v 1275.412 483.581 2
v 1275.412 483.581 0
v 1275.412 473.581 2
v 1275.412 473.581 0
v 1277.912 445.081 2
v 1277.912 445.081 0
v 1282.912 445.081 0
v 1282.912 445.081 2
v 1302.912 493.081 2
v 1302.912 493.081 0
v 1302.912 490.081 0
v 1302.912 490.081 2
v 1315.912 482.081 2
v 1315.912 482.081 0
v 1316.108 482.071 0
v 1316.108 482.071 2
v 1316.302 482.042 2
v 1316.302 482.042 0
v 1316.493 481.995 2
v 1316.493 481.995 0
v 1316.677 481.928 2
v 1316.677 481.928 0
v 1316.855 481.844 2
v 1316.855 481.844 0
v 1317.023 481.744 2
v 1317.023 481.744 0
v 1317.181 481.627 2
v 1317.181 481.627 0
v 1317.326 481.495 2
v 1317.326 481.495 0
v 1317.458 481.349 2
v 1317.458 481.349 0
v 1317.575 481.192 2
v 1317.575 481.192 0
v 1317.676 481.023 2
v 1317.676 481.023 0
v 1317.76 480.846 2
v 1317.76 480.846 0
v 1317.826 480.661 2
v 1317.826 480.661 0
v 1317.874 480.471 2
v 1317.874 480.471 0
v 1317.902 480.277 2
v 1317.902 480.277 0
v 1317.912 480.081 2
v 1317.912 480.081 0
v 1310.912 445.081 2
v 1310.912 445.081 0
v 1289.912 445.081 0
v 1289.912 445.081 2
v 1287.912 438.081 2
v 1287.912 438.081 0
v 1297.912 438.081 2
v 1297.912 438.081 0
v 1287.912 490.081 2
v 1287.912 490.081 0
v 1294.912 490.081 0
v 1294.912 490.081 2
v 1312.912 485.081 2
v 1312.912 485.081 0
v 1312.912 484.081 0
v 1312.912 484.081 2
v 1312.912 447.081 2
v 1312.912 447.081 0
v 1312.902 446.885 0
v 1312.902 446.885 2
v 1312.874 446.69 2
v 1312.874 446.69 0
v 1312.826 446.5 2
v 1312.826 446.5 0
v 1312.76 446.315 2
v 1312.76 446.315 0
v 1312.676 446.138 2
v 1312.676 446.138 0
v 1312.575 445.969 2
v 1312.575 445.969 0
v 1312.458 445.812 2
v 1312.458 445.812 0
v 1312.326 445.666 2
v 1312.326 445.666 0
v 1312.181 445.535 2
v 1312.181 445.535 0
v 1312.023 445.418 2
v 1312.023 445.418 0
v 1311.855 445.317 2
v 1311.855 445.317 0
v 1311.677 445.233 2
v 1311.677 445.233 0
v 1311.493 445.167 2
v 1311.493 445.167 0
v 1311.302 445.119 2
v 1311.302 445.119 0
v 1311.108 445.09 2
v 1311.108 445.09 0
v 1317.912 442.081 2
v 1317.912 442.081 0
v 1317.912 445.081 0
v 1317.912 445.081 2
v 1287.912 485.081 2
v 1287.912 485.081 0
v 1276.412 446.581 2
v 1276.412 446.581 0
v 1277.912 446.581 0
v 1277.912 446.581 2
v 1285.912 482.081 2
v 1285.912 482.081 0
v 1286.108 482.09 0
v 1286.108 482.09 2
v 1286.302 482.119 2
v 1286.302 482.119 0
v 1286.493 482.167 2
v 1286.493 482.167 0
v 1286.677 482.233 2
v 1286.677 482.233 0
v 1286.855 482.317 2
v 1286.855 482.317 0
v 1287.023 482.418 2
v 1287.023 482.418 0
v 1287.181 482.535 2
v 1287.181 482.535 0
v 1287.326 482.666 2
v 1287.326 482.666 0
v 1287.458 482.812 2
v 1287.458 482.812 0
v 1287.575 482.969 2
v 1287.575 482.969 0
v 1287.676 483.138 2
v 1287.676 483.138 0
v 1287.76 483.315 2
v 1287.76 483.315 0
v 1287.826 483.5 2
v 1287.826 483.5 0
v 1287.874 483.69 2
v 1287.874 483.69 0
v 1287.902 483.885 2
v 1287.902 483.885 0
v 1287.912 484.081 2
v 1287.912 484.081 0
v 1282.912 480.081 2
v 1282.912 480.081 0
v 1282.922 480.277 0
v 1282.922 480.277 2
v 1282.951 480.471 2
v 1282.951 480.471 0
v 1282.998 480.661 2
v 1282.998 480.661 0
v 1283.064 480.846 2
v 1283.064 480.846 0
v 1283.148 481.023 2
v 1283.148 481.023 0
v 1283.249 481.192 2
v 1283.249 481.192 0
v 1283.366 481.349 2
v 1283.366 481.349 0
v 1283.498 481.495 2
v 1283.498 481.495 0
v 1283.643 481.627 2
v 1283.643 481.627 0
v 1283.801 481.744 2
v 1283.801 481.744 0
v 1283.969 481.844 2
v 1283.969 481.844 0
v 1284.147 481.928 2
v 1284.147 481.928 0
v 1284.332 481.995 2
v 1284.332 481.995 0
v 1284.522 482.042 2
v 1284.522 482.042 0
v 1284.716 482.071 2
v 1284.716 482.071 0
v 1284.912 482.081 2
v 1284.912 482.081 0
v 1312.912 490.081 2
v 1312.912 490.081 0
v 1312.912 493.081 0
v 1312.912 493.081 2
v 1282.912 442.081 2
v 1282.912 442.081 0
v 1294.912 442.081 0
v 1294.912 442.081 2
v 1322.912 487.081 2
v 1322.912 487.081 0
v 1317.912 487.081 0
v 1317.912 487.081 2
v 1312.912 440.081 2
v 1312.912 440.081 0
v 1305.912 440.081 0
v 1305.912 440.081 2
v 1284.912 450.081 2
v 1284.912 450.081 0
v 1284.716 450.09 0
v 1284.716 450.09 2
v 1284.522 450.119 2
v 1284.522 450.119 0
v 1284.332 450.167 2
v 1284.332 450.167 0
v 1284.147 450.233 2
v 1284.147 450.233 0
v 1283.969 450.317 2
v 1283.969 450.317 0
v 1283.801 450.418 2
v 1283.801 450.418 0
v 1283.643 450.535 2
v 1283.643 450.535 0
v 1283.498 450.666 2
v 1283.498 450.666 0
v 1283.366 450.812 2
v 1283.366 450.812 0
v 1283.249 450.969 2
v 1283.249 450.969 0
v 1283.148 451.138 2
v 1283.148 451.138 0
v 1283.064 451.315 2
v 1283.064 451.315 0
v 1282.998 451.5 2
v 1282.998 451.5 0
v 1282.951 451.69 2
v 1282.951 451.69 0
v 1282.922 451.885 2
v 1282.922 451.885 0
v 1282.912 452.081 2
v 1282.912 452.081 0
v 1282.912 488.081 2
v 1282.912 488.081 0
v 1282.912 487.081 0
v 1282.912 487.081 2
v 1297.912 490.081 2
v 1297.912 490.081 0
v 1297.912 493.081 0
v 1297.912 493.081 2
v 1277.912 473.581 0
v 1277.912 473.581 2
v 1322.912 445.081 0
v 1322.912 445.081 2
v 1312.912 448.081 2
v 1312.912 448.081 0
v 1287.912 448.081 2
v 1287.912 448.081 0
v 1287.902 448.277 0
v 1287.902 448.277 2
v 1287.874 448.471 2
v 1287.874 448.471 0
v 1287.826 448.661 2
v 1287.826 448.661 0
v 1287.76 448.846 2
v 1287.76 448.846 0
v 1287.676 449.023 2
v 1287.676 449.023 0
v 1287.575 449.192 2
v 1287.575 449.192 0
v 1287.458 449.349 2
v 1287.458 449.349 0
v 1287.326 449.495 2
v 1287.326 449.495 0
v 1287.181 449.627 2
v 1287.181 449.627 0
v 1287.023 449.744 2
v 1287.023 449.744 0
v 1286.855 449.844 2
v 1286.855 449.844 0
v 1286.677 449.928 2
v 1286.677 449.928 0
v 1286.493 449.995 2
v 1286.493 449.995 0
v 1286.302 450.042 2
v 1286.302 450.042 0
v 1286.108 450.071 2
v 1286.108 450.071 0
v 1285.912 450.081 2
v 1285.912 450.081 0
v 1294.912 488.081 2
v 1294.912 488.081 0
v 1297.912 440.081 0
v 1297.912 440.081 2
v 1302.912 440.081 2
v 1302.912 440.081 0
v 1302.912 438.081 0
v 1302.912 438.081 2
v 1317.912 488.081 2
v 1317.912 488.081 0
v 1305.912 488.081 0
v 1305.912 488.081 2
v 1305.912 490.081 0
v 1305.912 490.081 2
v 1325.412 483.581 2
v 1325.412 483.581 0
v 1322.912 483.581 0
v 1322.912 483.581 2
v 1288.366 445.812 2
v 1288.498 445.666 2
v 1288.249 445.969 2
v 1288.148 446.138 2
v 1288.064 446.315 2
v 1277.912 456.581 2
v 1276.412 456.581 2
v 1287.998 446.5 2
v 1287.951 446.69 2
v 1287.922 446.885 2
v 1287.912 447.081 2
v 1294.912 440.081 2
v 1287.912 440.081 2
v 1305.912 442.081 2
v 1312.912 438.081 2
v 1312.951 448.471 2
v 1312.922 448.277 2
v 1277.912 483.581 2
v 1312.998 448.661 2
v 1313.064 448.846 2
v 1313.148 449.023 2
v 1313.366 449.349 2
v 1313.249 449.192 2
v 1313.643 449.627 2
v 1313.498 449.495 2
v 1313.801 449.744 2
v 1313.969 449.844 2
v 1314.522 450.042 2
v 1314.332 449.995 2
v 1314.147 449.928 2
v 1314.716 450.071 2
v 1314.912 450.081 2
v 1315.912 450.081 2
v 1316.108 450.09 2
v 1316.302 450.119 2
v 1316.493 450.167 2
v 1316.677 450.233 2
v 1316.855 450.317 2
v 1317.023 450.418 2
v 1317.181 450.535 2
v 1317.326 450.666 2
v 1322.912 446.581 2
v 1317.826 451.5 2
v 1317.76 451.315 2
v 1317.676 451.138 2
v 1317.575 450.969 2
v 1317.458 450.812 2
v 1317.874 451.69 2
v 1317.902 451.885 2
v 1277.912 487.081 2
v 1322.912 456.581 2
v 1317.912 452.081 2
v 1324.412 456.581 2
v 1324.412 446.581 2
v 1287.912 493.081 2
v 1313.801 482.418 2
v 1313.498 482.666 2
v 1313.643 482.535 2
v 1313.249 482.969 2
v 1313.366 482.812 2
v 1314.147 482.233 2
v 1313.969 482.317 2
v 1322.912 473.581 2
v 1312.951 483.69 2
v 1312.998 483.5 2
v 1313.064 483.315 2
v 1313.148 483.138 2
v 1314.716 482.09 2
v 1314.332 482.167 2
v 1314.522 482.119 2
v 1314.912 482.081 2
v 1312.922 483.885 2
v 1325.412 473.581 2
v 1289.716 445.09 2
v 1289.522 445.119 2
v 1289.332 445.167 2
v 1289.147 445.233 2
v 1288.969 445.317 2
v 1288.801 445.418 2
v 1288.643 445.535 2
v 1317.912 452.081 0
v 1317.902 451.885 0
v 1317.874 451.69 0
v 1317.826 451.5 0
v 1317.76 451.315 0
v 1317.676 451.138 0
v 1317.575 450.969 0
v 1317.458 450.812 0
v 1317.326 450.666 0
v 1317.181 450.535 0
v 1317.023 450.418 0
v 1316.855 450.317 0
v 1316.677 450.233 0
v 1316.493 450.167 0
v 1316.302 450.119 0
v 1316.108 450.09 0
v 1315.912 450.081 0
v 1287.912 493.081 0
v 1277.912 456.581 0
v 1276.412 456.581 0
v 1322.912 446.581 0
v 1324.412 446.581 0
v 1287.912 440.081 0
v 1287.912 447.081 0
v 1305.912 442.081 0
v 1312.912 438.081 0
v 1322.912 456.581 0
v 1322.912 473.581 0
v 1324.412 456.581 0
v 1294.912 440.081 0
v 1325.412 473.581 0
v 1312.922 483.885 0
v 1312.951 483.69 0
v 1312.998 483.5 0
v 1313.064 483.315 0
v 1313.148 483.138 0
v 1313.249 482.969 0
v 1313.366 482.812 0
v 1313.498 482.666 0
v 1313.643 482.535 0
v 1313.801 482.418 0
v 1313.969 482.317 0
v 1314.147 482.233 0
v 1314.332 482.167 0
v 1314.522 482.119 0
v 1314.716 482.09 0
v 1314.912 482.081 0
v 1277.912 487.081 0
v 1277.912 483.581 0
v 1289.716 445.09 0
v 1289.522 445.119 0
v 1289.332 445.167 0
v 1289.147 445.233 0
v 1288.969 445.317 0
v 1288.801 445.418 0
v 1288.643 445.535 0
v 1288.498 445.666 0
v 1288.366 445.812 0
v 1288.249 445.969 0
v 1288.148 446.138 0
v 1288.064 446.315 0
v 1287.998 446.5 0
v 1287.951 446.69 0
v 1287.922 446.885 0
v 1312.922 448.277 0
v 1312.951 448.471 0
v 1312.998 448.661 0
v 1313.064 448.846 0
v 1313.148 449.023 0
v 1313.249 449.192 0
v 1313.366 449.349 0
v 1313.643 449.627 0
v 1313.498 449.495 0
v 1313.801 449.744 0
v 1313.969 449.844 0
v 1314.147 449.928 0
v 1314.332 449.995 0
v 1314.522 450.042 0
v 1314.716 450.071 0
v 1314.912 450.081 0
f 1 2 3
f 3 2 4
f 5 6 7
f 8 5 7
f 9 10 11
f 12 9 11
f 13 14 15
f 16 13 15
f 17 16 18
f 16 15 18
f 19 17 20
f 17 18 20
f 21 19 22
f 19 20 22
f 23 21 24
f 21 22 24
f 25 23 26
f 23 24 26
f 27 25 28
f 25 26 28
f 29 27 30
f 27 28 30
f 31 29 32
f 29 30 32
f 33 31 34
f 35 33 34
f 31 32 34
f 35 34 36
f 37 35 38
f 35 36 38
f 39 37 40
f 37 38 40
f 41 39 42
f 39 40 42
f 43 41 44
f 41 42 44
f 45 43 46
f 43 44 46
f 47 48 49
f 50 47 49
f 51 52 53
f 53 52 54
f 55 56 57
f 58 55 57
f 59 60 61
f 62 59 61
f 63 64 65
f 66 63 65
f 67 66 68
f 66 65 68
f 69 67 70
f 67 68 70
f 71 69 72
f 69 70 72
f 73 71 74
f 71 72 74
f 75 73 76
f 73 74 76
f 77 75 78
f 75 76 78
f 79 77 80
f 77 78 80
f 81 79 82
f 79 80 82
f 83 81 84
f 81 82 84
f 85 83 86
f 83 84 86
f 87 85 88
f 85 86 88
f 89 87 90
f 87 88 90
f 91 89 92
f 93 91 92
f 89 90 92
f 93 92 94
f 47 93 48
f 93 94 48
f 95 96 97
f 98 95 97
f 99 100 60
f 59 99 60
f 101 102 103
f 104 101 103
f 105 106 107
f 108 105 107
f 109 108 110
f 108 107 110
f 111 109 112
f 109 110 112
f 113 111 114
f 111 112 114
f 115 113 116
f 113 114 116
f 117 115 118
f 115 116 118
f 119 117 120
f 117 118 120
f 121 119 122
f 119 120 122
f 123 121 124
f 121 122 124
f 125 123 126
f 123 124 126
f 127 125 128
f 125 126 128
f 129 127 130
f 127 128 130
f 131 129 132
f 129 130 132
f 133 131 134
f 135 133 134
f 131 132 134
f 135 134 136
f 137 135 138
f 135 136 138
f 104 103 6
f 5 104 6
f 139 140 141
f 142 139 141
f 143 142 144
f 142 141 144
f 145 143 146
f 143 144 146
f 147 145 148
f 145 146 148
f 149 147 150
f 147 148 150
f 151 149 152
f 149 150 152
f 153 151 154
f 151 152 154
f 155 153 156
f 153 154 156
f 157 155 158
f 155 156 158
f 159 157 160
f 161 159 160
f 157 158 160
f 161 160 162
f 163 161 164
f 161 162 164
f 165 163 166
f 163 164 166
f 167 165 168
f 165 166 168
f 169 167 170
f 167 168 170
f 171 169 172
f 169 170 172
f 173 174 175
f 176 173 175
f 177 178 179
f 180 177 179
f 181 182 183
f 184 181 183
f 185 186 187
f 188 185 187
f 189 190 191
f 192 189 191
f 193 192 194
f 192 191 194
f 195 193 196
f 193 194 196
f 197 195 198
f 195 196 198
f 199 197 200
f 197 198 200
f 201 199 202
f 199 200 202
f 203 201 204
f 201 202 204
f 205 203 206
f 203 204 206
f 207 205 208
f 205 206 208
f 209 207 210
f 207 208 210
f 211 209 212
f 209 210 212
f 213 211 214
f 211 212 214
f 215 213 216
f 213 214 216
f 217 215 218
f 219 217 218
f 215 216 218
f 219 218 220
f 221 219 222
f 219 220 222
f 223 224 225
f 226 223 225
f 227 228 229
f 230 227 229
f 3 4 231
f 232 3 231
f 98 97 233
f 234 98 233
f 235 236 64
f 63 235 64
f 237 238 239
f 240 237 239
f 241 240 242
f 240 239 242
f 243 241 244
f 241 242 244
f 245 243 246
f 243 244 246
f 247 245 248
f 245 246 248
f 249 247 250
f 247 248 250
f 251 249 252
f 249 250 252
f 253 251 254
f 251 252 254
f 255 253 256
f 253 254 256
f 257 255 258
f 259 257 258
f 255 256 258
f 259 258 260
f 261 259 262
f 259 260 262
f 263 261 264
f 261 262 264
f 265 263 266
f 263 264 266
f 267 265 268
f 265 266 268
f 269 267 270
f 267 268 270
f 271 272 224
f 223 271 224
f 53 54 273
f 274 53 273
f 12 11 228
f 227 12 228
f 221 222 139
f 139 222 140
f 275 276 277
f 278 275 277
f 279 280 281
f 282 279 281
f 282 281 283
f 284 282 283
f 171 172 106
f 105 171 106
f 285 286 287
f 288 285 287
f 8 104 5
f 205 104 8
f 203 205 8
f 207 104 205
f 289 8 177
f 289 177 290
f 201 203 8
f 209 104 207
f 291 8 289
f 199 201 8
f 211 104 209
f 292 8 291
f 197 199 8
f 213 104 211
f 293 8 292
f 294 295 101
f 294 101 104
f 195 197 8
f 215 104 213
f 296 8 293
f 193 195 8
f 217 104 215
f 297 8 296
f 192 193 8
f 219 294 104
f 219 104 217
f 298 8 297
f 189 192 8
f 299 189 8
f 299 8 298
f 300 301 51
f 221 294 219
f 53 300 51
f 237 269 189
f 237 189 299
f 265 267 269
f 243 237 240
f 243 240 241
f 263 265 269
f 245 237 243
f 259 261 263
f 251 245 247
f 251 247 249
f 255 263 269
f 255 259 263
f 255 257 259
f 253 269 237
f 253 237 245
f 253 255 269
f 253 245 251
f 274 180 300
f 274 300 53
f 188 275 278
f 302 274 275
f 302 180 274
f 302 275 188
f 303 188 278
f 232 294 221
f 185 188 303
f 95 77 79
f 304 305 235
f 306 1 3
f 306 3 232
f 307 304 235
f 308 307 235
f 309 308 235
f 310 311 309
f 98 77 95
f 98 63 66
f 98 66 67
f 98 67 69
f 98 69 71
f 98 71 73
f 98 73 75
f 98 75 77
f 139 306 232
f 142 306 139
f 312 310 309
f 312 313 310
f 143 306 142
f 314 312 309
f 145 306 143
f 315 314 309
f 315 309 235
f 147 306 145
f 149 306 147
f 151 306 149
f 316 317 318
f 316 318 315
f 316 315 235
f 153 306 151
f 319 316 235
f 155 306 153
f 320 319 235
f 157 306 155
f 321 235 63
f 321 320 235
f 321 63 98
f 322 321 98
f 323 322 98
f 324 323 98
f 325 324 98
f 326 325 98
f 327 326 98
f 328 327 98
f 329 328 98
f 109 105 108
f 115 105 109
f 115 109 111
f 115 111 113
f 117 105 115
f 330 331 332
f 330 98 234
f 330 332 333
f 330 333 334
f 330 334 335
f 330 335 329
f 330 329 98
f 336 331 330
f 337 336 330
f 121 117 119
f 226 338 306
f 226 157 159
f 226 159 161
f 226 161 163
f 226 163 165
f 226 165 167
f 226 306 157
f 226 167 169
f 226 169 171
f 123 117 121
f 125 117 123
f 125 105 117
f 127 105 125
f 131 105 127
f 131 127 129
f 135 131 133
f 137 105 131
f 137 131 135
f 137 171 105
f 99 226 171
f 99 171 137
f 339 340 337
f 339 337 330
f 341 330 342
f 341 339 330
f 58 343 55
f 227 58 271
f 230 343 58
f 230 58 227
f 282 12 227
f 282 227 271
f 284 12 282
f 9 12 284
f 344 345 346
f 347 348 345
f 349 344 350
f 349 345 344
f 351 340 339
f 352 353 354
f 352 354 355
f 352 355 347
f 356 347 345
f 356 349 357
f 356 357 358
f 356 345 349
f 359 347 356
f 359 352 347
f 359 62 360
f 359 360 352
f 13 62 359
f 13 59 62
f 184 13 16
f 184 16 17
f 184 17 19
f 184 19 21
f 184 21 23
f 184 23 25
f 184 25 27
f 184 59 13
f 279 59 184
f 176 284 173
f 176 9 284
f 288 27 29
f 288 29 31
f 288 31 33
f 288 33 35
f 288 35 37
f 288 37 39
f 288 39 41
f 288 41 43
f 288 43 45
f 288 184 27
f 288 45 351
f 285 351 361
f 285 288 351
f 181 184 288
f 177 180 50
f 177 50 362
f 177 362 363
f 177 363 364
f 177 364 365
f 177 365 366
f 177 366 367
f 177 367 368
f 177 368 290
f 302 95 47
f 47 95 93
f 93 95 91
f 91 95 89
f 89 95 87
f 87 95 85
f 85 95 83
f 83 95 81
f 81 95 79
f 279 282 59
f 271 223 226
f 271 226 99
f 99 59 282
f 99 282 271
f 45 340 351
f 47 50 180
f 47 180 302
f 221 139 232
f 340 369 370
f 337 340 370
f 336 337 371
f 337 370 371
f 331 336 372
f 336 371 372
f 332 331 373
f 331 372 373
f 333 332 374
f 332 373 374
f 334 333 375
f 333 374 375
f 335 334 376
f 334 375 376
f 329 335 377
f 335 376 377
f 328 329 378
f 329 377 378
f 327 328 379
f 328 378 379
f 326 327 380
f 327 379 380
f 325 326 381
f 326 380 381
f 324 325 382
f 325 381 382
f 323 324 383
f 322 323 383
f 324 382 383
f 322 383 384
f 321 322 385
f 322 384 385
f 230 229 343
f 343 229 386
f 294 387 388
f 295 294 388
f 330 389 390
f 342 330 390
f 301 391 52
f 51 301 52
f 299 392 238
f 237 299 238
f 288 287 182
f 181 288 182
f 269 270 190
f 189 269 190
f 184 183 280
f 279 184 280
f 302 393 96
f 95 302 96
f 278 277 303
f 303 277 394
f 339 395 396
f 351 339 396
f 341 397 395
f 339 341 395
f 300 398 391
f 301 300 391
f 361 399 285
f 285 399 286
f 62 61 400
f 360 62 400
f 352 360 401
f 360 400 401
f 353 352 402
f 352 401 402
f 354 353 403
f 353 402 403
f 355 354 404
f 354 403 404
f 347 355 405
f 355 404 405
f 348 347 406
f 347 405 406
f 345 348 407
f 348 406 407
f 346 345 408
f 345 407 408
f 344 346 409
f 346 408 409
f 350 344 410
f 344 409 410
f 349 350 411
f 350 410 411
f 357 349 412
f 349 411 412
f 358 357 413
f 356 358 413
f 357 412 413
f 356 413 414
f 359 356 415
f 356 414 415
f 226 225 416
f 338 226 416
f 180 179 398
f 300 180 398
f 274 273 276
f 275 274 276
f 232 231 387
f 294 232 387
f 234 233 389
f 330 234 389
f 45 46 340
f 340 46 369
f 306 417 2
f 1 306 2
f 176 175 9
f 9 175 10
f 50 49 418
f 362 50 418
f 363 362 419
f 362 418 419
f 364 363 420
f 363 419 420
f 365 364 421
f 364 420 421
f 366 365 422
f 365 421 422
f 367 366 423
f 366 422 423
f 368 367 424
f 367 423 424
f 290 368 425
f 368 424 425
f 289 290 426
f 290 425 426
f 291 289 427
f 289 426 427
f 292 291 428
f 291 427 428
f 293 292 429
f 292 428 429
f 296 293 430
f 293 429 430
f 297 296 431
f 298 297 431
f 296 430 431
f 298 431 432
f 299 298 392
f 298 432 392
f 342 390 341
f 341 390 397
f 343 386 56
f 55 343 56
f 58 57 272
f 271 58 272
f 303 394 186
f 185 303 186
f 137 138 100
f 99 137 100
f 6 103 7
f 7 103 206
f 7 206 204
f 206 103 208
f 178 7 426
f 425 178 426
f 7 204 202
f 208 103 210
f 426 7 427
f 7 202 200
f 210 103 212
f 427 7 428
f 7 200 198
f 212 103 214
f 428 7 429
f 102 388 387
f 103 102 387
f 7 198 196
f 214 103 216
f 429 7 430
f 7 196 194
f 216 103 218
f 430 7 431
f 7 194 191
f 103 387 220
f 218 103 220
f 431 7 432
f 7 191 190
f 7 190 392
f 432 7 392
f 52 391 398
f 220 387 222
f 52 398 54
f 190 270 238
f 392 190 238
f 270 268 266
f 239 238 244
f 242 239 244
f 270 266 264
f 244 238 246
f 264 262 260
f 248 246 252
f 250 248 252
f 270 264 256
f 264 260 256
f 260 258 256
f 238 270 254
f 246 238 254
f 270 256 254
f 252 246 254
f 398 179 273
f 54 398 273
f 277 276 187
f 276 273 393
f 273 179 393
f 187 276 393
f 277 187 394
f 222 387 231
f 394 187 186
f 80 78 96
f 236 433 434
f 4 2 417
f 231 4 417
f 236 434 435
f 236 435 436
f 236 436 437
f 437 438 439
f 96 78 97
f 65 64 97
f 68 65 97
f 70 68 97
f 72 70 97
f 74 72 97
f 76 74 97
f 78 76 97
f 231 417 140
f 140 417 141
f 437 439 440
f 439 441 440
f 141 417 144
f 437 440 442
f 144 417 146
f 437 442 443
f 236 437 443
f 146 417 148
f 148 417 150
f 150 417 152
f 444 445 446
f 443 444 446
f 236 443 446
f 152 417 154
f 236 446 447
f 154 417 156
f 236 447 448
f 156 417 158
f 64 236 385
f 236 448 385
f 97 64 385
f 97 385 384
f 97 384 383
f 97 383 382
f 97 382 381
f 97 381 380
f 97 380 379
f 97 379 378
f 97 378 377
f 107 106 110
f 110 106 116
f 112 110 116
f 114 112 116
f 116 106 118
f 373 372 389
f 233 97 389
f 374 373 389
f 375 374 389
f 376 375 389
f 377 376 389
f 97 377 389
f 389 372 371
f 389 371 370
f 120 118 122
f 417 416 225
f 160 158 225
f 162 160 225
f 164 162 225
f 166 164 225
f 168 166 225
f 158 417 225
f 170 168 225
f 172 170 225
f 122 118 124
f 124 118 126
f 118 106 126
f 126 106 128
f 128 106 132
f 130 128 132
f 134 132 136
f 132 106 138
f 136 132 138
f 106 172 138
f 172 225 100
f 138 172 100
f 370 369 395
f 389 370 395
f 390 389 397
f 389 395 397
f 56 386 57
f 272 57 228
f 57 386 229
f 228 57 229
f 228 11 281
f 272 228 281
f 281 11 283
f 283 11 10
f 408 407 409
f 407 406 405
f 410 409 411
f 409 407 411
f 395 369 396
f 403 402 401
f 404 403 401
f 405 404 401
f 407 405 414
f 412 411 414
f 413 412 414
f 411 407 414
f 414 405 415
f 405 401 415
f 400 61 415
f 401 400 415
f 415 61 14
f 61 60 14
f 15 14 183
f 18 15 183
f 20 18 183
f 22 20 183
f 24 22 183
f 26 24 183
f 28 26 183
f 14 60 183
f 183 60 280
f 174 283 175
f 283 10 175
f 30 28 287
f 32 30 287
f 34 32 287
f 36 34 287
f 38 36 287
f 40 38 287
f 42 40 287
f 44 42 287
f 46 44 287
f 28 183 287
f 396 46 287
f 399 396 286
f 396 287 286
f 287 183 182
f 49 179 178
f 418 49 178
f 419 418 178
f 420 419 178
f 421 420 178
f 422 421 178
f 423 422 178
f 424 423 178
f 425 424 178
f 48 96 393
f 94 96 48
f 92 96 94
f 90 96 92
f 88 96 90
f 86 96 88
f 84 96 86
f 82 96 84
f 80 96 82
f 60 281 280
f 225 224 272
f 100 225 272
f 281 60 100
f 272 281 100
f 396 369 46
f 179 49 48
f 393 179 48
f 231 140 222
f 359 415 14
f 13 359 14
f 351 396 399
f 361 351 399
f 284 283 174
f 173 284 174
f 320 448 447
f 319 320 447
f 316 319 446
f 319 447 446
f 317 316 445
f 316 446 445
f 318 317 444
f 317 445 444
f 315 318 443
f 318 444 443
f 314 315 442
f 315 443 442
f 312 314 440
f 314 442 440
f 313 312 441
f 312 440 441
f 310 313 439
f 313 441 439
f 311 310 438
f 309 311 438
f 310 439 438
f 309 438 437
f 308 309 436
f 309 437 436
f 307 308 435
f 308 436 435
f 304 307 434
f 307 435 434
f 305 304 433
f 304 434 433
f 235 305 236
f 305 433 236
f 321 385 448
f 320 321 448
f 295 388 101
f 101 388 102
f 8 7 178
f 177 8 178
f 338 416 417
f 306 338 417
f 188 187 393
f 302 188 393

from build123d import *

# Parameters (mm, degrees)
EXTRUDE_1_DEPTH = 2


with BuildPart() as part:
    # Model → 凸台-拉伸1 (new body)
    with BuildSketch(Plane.XY):
        Polygon((1277.912077, 487.080631391), (1277.912077, 483.580631391), (1275.412077, 483.580631391), (1275.412077, 473.580631391), (1277.912077, 473.580631391), (1277.912077, 456.580631391), (1276.412077, 456.580631391), (1276.412077, 446.580631391), (1277.912077, 446.580631391), (1277.912077, 445.080631391), (1282.912077, 445.080631391), (1282.912077, 442.080631391), (1294.912077, 442.080631391), (1294.912077, 440.080631391), (1287.912077, 440.080631391), (1287.912077, 438.080631391), (1297.912077, 438.080631391), (1297.912077, 440.080631391), (1302.912077, 440.080631391), (1302.912077, 438.080631391), (1312.912077, 438.080631391), (1312.912077, 440.080631391), (1305.912077, 440.080631391), (1305.912077, 442.080631391), (1317.912077, 442.080631391), (1317.912077, 445.080631391), (1322.912077, 445.080631391), (1322.912077, 446.580631391), (1324.412077, 446.580631391), (1324.412077, 456.580631391), (1322.912077, 456.580631391), (1322.912077, 473.580631391), (1325.412077, 473.580631391), (1325.412077, 483.580631391), (1322.912077, 483.580631391), (1322.912077, 487.080631391), (1317.912077, 487.080631391), (1317.912077, 488.080631391), (1305.912077, 488.080631391), (1305.912077, 490.080631391), (1312.912077, 490.080631391), (1312.912077, 493.080631391), (1302.912077, 493.080631391), (1302.912077, 490.080631391), (1297.912077, 490.080631391), (1297.912077, 493.080631391), (1287.912077, 493.080631391), (1287.912077, 490.080631391), (1294.912077, 490.080631391), (1294.912077, 488.080631391), (1282.912077, 488.080631391), (1282.912077, 487.080631391), align=None)
        with BuildLine():
            Line((1284.912077, 482.080631391), (1285.912077, 482.080631391))
            ThreePointArc((1285.912077, 482.080631391), (1287.326290562, 482.666417828), (1287.912077, 484.080631391))
            Line((1287.912077, 484.080631391), (1287.912077, 485.080631391))
            Line((1287.912077, 485.080631391), (1312.912077, 485.080631391))
            Line((1312.912077, 485.080631391), (1312.912077, 484.080631391))
            ThreePointArc((1312.912077, 484.080631391), (1313.497863438, 482.666417828), (1314.912077, 482.080631391))
            Line((1314.912077, 482.080631391), (1315.912077, 482.080631391))
            ThreePointArc((1315.912077, 482.080631391), (1317.326290562, 481.494844953), (1317.912077, 480.080631391))
            Line((1317.912077, 480.080631391), (1317.912077, 452.080631391))
            ThreePointArc((1317.912077, 452.080631391), (1317.326290562, 450.666417828), (1315.912077, 450.080631391))
            Line((1315.912077, 450.080631391), (1314.912077, 450.080631391))
            ThreePointArc((1314.912077, 450.080631391), (1313.497863438, 449.494844953), (1312.912077, 448.080631391))
            Line((1312.912077, 448.080631391), (1312.912077, 447.080631391))
            ThreePointArc((1312.912077, 447.080631391), (1312.326290562, 445.666417828), (1310.912077, 445.080631391))
            Line((1310.912077, 445.080631391), (1289.912077, 445.080631391))
            ThreePointArc((1289.912077, 445.080631391), (1288.497863438, 445.666417828), (1287.912077, 447.080631391))
            Line((1287.912077, 447.080631391), (1287.912077, 448.080631391))
            ThreePointArc((1287.912077, 448.080631391), (1287.326290562, 449.494844953), (1285.912077, 450.080631391))
            Line((1285.912077, 450.080631391), (1284.912077, 450.080631391))
            ThreePointArc((1284.912077, 450.080631391), (1283.497863438, 450.666417828), (1282.912077, 452.080631391))
            Line((1282.912077, 452.080631391), (1282.912077, 480.080631391))
            ThreePointArc((1282.912077, 480.080631391), (1283.497863438, 481.494844953), (1284.912077, 482.080631391))
        make_face(mode=Mode.SUBTRACT)
    extrude(amount=EXTRUDE_1_DEPTH)


solid = part.part
